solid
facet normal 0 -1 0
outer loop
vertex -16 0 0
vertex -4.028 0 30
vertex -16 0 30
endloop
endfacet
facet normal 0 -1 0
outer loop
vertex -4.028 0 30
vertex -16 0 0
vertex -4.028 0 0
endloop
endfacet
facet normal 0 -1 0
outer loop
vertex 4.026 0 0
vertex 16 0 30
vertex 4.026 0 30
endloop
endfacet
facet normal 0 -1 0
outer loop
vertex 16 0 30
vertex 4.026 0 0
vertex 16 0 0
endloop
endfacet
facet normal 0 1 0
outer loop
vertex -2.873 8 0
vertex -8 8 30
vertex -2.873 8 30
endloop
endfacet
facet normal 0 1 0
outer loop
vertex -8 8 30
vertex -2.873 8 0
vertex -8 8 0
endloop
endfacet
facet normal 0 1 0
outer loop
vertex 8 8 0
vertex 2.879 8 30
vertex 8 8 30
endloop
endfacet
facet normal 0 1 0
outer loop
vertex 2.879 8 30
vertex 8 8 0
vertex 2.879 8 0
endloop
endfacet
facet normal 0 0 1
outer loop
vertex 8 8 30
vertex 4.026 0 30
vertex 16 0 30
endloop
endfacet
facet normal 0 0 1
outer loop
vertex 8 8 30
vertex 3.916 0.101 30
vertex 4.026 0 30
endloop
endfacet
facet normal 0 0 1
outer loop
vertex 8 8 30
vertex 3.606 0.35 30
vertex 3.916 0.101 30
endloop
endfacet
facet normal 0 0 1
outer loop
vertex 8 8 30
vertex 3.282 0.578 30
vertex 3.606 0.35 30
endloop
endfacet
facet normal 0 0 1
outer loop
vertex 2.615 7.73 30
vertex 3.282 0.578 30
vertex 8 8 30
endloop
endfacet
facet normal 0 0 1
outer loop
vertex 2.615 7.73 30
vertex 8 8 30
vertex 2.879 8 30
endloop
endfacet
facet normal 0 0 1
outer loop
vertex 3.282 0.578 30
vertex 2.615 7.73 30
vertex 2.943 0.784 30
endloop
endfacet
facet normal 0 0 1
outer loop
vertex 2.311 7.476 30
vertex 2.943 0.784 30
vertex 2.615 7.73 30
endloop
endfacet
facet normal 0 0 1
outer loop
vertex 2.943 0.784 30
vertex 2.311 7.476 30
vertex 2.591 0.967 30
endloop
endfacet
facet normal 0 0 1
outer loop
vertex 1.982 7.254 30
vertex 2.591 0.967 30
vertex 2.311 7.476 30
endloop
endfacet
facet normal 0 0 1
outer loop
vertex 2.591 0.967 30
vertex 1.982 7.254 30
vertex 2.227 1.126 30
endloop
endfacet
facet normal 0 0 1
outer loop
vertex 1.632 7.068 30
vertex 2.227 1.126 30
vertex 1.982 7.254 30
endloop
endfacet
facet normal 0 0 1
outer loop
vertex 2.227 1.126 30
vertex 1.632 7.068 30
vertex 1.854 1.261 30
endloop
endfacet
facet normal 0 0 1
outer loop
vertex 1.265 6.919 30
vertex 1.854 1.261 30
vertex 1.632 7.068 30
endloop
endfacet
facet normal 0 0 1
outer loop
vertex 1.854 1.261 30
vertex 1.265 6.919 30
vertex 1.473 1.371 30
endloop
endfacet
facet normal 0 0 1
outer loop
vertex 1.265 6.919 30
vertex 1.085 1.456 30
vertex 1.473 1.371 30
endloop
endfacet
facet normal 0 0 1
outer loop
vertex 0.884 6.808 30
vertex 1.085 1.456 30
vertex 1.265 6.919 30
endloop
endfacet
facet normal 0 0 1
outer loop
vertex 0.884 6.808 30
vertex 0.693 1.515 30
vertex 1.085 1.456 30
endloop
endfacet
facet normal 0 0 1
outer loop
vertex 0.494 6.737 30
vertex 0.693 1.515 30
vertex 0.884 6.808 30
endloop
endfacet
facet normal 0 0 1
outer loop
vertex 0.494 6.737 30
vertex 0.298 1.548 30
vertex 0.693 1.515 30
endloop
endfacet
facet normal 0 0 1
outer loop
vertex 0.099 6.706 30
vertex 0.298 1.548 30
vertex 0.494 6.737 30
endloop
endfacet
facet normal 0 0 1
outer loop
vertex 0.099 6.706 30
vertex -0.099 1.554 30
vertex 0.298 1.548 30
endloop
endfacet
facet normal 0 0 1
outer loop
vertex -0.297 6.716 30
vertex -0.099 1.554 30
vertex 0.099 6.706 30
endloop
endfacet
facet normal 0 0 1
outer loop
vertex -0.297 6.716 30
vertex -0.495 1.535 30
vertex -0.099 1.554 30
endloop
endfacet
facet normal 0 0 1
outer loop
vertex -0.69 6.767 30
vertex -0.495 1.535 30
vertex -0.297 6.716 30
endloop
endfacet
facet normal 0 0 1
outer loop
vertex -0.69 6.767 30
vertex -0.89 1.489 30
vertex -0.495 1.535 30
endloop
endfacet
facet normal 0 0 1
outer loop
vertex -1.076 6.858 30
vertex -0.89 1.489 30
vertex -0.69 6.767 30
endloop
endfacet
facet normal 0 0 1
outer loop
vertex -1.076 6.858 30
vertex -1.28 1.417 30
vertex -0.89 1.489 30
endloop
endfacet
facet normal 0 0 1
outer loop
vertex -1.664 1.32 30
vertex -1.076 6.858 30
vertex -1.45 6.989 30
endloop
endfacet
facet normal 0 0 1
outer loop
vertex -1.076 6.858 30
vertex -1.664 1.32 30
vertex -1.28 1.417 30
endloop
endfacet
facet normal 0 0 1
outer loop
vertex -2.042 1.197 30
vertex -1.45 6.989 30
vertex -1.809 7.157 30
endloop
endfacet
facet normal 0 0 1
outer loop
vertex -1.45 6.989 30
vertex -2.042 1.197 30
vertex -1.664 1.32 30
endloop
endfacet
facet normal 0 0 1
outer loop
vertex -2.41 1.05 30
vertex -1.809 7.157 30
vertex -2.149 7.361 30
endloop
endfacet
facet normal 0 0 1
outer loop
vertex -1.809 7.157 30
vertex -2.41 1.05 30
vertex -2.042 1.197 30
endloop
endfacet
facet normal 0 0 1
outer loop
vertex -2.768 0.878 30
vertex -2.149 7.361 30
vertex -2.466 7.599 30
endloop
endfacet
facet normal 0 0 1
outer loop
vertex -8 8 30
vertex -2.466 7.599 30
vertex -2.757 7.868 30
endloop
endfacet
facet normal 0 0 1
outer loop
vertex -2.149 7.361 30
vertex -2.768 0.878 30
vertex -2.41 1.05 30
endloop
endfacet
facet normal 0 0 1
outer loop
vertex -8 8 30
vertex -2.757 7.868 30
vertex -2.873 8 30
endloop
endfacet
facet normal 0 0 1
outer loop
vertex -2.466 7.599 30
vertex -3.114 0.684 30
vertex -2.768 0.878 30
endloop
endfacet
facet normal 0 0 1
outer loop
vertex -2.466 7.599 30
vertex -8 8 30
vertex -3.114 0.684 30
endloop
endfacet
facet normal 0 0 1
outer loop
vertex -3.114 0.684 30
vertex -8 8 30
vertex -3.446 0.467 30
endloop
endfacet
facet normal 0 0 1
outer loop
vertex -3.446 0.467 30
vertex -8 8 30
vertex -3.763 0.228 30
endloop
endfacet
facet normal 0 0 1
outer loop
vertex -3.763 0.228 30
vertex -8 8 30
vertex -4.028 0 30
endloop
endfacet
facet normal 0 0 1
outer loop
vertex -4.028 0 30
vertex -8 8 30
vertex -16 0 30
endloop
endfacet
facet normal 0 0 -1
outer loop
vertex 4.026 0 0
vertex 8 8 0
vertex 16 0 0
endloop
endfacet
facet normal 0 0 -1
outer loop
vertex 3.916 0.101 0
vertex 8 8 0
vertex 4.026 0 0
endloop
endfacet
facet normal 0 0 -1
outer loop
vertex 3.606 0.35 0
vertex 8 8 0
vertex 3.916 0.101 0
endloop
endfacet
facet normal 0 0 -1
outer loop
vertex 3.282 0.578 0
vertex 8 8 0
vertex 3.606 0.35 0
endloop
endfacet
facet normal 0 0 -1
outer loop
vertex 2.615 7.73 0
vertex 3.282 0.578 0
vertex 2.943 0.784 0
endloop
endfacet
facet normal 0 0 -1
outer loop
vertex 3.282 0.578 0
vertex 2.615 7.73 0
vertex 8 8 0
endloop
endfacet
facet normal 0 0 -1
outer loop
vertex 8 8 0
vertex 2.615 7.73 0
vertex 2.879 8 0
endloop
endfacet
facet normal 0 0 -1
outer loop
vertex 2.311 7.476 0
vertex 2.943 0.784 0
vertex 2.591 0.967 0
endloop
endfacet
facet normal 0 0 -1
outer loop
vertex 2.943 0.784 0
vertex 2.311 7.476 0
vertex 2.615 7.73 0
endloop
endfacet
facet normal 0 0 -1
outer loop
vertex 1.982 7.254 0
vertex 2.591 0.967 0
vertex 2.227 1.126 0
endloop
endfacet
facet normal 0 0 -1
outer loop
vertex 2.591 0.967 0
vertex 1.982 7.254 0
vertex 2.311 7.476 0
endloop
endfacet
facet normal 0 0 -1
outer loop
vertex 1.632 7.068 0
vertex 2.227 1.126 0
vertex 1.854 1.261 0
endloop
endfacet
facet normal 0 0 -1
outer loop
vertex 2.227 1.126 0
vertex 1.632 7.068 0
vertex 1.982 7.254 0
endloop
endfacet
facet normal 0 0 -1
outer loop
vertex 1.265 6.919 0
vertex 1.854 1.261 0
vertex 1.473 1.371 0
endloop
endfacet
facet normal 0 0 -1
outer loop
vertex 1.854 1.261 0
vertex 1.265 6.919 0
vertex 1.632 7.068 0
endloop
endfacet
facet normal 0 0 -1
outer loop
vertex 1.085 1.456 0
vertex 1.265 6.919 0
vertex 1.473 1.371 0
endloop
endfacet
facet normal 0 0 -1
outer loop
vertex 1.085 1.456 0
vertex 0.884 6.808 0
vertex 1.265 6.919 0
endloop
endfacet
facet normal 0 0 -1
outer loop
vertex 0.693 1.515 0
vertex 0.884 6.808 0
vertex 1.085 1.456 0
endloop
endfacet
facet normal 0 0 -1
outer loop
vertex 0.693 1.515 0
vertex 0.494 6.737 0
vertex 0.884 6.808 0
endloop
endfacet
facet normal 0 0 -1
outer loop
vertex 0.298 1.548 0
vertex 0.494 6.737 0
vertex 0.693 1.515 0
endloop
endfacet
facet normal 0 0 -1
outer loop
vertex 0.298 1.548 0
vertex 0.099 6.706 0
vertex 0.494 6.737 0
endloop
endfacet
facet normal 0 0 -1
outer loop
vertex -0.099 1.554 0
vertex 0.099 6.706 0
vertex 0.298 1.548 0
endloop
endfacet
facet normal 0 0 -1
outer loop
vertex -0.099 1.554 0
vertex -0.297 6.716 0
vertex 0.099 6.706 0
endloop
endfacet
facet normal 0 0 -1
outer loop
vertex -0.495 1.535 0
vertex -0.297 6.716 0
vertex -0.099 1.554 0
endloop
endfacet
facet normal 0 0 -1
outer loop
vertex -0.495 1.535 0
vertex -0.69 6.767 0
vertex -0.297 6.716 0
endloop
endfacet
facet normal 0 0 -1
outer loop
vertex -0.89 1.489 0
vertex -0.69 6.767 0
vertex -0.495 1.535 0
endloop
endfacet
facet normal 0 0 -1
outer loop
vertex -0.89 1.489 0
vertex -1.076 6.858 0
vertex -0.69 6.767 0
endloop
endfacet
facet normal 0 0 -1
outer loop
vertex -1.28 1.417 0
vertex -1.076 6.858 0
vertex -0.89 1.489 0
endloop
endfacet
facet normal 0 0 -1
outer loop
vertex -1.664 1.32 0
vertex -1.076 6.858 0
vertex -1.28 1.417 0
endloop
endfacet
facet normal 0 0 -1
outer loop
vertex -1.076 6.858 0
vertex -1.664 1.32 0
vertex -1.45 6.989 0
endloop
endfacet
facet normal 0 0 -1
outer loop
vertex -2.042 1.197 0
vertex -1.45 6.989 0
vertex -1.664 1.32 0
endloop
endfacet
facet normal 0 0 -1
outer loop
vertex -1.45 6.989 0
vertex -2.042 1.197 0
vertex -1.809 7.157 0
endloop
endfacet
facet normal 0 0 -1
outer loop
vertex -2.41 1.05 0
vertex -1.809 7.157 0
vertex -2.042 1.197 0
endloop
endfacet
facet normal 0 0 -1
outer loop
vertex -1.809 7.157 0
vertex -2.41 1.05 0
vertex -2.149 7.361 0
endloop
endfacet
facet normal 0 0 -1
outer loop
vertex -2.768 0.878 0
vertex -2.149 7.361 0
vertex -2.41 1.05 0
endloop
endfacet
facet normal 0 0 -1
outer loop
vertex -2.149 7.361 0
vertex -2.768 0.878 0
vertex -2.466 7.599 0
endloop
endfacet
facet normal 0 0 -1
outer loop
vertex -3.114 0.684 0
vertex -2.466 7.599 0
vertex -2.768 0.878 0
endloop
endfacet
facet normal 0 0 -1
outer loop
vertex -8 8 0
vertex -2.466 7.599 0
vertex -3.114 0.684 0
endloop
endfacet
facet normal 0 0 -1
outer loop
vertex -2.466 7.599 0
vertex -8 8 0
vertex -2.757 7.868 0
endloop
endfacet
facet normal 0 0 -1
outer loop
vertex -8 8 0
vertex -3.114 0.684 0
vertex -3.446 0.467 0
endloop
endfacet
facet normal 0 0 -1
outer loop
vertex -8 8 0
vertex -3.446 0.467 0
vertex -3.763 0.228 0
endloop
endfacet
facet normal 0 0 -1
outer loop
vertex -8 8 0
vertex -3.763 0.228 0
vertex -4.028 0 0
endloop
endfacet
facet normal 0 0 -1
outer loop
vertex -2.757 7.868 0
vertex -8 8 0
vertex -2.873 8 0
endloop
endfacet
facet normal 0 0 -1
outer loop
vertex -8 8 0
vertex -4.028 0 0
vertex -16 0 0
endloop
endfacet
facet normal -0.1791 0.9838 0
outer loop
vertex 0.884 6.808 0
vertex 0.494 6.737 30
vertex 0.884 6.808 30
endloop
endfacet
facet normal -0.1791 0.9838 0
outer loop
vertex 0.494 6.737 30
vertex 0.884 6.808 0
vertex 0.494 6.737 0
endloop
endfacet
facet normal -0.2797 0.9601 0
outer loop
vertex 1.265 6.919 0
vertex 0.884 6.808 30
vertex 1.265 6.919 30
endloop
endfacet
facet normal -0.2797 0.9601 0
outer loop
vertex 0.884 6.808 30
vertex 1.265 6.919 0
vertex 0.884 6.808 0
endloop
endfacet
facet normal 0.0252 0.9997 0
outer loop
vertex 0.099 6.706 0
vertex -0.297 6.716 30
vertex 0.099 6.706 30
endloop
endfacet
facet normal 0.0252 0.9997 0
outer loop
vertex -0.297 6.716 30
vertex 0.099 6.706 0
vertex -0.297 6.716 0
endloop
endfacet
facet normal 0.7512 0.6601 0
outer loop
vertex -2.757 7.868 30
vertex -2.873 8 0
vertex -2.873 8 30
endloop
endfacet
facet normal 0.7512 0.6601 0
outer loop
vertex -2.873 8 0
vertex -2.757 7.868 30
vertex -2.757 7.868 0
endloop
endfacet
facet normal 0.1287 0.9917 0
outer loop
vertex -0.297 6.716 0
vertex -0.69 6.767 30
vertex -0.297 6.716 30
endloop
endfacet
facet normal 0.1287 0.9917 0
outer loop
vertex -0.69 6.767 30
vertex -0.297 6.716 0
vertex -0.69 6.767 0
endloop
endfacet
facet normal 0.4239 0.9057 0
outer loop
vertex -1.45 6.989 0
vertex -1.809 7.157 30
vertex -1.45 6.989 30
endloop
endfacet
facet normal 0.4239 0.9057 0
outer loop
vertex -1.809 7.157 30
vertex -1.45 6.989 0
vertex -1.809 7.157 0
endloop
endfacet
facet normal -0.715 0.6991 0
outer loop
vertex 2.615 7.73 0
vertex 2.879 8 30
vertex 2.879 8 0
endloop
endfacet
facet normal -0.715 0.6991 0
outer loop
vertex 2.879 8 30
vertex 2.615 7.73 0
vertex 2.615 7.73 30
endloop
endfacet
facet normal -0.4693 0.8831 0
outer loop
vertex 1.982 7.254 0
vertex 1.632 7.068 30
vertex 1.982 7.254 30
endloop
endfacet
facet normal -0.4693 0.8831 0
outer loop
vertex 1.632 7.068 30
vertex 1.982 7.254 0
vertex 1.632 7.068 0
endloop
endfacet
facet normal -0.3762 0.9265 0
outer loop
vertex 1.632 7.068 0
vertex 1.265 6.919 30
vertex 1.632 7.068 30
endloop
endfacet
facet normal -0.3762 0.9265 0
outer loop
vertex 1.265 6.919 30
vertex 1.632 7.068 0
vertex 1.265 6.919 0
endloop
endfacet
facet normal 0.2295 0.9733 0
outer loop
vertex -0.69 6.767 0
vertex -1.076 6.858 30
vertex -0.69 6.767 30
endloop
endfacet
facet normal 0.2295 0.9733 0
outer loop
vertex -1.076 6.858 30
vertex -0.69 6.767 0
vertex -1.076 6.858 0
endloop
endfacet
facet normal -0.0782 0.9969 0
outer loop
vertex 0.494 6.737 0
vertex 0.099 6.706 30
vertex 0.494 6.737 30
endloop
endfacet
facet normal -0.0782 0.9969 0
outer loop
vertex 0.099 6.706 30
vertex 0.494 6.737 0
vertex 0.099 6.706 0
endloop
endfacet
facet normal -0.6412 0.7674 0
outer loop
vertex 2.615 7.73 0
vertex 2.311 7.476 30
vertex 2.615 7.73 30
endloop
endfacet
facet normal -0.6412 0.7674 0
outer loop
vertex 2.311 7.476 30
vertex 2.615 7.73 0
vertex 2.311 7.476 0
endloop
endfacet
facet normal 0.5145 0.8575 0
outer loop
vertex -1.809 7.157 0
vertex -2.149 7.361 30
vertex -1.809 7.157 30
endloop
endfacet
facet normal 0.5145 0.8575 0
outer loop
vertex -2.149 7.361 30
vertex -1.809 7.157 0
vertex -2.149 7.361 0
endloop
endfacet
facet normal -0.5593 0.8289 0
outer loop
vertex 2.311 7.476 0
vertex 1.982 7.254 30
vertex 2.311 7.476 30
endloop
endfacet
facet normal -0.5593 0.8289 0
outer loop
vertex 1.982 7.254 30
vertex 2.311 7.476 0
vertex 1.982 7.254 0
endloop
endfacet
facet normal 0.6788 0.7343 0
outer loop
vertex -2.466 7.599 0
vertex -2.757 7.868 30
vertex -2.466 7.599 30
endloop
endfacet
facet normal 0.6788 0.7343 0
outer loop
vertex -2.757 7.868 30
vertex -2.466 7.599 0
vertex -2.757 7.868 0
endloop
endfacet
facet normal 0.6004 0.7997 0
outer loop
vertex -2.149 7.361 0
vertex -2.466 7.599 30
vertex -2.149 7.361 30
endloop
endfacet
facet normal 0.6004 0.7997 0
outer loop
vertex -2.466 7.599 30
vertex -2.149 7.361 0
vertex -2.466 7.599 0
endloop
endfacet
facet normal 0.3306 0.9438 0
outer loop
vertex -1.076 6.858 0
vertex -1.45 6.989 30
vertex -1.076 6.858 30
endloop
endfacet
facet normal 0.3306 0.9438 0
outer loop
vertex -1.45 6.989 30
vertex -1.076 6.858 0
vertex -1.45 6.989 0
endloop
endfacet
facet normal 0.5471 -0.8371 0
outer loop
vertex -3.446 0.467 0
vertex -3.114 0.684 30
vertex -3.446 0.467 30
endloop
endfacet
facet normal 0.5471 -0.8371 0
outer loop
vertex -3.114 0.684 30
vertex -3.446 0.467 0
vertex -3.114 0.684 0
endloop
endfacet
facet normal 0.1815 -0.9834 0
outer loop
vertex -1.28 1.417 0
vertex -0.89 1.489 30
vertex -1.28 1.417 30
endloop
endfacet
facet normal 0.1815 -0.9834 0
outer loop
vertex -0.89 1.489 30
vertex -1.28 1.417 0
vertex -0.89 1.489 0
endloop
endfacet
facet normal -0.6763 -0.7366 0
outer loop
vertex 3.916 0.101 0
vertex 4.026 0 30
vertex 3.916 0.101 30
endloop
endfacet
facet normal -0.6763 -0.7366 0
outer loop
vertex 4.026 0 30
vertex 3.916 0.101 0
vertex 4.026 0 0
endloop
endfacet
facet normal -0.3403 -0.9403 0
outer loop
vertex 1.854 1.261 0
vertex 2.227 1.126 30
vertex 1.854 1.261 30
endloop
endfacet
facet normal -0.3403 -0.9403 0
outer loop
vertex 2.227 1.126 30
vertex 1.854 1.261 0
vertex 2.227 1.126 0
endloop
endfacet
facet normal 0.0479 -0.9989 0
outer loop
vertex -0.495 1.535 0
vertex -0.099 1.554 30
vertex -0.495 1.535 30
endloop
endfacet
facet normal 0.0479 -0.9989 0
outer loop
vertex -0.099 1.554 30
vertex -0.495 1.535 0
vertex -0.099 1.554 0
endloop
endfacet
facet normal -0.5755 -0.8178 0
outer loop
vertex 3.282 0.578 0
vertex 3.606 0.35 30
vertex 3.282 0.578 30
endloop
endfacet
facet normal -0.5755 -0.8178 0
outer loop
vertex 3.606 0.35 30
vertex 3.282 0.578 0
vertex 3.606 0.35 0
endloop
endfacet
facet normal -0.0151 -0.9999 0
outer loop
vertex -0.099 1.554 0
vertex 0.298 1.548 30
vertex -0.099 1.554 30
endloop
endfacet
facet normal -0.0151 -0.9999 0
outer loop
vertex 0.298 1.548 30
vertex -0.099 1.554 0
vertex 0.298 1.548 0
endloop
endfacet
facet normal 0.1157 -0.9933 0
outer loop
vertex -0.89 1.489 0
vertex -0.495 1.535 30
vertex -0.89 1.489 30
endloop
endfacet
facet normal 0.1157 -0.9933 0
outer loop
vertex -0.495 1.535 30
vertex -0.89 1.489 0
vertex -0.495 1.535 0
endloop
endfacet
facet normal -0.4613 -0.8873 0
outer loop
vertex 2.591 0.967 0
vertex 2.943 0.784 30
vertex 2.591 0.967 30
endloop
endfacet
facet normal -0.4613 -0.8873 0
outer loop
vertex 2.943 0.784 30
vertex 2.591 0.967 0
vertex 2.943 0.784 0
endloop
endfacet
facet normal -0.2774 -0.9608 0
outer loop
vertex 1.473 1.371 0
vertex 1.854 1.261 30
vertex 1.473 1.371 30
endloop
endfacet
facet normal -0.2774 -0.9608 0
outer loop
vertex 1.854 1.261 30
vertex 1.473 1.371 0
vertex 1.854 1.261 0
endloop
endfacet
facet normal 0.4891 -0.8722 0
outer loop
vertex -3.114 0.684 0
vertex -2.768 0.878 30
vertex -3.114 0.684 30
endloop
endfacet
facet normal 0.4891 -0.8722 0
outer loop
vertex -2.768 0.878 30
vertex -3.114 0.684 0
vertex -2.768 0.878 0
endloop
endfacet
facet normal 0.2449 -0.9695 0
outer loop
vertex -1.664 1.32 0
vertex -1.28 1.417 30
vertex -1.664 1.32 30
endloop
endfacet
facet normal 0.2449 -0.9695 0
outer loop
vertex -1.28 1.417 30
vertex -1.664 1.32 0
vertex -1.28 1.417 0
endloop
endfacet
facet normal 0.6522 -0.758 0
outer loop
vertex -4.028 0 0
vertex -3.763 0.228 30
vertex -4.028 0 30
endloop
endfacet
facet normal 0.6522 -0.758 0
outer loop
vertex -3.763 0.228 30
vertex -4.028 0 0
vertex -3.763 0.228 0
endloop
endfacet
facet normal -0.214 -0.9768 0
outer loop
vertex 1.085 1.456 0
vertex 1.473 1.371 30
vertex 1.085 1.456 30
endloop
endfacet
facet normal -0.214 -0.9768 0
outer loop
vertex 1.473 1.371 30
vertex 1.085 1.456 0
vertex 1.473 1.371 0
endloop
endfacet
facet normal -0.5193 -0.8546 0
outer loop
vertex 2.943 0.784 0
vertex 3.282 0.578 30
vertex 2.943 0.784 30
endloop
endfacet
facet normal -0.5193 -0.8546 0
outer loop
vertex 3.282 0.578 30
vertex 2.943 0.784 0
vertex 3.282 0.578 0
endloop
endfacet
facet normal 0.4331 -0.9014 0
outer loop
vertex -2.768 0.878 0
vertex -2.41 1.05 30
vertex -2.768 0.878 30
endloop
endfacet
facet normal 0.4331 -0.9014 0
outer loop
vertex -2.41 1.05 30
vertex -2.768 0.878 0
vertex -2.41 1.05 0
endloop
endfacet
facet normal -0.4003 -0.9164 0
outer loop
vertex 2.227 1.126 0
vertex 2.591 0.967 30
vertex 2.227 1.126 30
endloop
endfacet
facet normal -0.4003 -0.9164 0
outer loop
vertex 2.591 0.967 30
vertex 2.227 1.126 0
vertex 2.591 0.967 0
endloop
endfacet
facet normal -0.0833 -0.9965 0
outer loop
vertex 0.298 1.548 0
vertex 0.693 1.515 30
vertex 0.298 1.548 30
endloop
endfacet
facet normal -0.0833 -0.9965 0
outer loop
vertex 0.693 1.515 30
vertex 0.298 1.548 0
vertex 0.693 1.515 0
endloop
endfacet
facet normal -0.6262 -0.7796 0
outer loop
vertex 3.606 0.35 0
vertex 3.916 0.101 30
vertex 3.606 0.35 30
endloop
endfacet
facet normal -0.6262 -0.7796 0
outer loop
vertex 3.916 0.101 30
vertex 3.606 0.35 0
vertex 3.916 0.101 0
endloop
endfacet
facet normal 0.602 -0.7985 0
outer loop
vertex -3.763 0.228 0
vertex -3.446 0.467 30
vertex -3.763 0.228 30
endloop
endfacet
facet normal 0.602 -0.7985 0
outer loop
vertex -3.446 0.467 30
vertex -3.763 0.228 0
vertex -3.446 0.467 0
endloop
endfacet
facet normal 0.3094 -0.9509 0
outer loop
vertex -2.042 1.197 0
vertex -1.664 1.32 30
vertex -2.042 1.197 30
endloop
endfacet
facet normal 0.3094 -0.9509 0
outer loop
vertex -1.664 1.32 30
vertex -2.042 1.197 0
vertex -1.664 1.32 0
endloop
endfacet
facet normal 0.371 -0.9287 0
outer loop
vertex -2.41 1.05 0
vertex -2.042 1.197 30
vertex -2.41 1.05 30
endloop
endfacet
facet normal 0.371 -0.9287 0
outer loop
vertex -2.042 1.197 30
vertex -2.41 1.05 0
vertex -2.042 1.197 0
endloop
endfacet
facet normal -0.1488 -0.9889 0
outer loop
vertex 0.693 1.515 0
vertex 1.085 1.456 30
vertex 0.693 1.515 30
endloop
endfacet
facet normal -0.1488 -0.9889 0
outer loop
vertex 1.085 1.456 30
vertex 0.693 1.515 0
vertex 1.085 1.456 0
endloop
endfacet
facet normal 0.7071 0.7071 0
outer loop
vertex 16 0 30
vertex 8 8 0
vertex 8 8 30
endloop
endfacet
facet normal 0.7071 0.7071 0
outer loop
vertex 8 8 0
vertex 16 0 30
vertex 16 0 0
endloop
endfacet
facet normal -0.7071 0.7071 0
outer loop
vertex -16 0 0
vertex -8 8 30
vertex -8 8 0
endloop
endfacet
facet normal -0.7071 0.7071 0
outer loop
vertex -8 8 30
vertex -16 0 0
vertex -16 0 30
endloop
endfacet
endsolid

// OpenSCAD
$fa = 1.0;
$fs = 0.4;
// Using 25 ul syringe: maine body in clamp radius = 3.85 mm
// camera body radius = 6 mm
translate([0,16,0]) rotate([90,0,0])
difference(){
    translate([-25,0,8.]) cube([50,30,8]);
    translate([0,-1,5.445]) rotate([270,0,0]) cylinder(r=3.85, h=32);
    translate([0,-1,20.445]) rotate([270,0,0]) cylinder(r=6, h=32);
    rotate([0,45,0]) translate([0,-1,0]) cube([47,47,34]);
    rotate([0,-45,0]) translate([-47,-1,0]) cube([47,47,34]);
}
